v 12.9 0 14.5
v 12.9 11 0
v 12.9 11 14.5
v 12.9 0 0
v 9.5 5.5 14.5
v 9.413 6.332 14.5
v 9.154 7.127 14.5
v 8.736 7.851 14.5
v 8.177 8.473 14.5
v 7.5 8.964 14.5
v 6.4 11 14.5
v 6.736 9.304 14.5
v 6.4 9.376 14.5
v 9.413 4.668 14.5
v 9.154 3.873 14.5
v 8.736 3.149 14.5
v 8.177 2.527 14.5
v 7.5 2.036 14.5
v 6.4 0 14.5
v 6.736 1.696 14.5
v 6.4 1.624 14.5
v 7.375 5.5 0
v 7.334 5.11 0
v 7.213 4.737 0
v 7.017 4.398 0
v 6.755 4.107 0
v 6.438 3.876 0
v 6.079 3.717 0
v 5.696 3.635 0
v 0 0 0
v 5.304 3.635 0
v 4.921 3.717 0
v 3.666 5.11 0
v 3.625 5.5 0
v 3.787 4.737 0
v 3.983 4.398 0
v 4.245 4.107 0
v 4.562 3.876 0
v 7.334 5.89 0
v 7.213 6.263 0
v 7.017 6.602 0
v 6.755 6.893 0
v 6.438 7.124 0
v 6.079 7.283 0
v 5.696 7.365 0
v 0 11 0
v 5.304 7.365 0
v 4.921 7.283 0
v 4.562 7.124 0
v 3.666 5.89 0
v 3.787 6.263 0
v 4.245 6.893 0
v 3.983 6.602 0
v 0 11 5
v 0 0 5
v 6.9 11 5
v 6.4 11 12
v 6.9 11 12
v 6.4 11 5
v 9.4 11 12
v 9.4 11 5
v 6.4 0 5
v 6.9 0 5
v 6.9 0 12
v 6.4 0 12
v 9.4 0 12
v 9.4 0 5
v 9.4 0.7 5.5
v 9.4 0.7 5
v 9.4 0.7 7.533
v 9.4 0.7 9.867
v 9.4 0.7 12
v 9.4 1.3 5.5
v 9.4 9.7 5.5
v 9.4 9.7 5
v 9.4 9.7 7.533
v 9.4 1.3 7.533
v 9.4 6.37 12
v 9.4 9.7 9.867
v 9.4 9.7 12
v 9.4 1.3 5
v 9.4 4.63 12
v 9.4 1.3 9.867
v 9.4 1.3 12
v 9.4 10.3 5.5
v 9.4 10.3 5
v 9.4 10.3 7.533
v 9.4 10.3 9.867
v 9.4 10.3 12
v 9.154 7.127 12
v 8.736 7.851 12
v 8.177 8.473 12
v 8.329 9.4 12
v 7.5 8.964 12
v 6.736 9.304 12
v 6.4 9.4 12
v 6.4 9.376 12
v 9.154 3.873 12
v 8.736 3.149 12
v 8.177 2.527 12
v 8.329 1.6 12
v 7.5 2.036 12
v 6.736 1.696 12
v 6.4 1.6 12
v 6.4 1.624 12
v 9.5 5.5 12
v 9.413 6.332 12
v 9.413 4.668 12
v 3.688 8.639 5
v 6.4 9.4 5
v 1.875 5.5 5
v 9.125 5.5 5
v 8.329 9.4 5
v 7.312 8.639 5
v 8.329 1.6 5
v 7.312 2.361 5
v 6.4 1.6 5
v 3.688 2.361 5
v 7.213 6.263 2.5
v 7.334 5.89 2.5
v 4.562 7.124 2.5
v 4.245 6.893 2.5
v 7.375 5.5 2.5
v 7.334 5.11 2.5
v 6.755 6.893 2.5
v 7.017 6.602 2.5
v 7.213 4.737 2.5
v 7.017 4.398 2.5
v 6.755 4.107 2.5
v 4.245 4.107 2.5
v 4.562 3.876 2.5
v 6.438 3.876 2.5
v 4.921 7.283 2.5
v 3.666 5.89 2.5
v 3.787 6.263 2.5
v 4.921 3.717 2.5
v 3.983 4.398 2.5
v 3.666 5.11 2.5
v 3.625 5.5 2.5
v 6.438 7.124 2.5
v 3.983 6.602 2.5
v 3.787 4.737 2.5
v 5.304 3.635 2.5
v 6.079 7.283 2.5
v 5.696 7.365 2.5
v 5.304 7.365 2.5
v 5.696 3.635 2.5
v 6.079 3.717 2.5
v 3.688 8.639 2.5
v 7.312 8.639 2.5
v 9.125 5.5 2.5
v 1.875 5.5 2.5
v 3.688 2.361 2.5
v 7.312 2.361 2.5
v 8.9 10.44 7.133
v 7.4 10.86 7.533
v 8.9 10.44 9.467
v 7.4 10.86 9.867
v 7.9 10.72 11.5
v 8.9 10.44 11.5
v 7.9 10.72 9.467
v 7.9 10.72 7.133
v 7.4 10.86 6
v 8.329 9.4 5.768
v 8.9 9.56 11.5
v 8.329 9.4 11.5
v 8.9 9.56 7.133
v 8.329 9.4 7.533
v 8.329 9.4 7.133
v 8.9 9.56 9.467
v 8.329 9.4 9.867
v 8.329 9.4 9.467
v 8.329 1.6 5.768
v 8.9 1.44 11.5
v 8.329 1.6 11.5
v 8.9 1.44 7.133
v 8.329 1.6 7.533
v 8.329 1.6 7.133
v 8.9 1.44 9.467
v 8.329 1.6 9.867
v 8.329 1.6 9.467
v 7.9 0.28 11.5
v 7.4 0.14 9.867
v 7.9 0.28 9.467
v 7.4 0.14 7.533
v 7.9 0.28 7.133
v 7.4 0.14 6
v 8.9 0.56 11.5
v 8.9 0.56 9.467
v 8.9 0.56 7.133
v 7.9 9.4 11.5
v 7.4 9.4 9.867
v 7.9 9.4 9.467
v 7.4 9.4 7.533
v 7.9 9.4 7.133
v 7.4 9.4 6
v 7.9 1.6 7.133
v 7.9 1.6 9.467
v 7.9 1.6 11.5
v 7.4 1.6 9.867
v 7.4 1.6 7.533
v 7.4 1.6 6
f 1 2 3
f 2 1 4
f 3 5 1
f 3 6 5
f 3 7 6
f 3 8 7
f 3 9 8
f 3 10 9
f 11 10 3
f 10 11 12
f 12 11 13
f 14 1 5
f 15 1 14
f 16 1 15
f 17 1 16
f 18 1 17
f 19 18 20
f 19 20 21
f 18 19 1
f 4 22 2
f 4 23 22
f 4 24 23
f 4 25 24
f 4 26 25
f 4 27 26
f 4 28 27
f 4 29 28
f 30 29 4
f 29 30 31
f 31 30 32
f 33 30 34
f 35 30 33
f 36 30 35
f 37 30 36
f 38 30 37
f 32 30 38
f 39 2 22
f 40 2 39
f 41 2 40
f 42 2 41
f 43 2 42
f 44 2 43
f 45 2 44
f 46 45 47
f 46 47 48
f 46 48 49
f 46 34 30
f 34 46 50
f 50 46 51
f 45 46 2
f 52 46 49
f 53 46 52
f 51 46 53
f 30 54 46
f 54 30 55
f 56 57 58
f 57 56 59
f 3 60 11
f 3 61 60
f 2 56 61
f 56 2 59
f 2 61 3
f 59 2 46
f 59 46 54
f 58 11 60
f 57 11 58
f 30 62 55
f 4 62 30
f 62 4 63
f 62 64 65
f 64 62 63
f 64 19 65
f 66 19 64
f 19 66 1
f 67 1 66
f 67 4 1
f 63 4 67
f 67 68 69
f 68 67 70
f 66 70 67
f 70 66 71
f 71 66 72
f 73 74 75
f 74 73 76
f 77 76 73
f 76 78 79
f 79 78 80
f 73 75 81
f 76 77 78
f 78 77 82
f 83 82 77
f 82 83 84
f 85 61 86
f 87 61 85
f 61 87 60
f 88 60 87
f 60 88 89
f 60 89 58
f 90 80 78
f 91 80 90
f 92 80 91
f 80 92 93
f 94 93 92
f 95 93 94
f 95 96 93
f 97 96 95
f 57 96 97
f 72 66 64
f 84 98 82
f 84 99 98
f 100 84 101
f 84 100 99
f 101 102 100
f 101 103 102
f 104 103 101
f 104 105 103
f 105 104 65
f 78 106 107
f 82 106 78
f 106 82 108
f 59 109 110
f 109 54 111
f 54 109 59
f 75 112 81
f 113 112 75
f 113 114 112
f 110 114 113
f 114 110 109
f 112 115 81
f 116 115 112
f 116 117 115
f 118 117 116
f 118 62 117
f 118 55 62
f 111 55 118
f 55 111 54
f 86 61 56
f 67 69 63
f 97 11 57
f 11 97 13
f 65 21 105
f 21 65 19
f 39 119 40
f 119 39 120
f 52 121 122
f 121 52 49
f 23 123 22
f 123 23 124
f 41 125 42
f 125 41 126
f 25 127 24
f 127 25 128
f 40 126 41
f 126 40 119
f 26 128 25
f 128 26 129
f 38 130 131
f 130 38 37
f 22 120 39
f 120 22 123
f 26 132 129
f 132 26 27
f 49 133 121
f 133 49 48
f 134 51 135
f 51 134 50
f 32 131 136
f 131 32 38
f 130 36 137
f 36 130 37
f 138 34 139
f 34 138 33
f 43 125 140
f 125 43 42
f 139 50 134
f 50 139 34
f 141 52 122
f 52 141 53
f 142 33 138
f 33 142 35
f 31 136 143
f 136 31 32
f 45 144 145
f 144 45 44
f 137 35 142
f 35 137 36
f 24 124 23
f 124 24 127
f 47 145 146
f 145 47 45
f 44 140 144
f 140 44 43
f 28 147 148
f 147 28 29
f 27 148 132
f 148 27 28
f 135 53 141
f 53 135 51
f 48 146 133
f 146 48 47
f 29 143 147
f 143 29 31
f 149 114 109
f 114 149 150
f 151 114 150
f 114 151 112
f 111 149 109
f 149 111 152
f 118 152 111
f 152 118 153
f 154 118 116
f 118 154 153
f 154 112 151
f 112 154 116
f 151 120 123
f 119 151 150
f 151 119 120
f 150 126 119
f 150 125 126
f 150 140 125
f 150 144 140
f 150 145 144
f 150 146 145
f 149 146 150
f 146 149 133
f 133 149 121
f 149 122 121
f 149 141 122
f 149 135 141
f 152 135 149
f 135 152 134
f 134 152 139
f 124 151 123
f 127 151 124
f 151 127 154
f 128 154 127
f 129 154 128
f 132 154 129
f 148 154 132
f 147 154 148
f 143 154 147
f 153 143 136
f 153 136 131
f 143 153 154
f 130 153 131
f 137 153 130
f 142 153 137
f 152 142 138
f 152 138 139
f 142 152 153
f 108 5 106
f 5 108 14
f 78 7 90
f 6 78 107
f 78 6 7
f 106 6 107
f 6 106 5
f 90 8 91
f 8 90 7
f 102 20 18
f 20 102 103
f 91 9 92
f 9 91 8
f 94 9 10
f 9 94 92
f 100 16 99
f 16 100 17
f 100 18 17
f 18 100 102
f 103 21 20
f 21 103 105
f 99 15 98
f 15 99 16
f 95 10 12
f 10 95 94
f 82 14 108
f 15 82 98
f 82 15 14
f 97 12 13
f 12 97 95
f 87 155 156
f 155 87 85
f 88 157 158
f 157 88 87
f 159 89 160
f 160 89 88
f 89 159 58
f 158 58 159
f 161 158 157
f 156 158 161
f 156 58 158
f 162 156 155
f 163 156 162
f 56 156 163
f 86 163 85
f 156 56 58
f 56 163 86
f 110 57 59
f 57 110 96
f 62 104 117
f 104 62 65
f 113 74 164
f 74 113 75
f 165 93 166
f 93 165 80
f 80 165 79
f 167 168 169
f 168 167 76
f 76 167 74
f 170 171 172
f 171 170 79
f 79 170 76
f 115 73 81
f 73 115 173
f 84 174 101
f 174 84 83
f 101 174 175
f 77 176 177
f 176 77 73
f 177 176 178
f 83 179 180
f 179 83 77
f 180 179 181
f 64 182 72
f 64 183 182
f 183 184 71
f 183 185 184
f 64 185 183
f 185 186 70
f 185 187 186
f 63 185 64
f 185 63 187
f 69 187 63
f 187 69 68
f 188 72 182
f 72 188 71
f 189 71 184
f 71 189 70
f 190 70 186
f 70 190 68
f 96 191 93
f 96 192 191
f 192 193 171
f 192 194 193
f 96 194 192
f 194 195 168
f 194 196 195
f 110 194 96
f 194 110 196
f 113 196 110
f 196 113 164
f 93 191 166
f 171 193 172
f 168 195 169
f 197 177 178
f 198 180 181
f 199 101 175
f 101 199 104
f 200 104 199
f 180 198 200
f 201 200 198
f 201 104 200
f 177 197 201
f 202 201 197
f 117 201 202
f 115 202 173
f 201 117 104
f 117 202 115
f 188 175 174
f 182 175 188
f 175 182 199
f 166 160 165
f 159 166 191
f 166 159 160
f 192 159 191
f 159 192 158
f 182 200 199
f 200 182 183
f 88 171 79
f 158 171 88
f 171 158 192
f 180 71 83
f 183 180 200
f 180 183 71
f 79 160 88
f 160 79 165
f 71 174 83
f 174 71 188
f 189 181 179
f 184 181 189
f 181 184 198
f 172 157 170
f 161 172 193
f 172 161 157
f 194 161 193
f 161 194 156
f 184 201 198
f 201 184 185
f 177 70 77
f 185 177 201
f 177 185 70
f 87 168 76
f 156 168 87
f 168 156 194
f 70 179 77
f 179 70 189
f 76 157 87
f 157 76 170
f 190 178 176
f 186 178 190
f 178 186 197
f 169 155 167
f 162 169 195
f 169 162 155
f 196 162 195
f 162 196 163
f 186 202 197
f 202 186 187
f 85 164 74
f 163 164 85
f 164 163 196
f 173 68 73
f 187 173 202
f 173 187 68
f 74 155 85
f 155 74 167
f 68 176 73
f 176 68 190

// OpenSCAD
/*
  OneUp bed platform nut holder(s)
  
  M3 nut used with heated bed on TwoUp (v2) and OneUp v2
  M4 nut used with basic bed (v2)
  
  Changes:
    Thicker vertical wall
    Removed lip on upper horizontal surface
    Resized hexagonal and circular holes to conform to M3 bolt and screw sizes
    
*/

x_origin = 0;
y_origin = 0;
z_origin = 0;
x_long_inset = 9.4;
x_riser = 3.5;
x_length = x_long_inset + x_riser;
x_overhang = 3;
z_base = 5;
z_riser = 7;
z_top = 2.5;
z_height = z_base + z_riser + z_top;

y_constant = 11;                            // Piece is always 10mm wide
x_hole_offset = 5.5;                        // Hole is always 5.0mm from innermost edge
y_hole_offset = y_constant / 2;             // Center the hole

spring_diameter = 8.0;    // spring is 8mm

// Hardware specs (with extra allowance for 
M3_adjustment = 0.75;
M4_adjustment = 0.75;
M3_bolt_diameter = 3;
M4_bolt_diameter = 4;
M3_nut_diameter = 6.5;
M4_nut_diameter = 10;
M3_nut_height = 2.5;
M4_nut_height = 3.0;

// Point to either M3 or M4 specs
bolt_diameter = M3_bolt_diameter + M3_adjustment;
nut_diameter = M3_nut_diameter + M3_adjustment;
nut_height = M3_nut_height;                                 // Did not add adjustment because z-axis pretty accurate
nut_offset = z_base - nut_height;

// To make the actual code easier to read
x_cutout_1 = x_long_inset;
x_cutout_2 = x_long_inset - x_overhang;
z_origin_cutout_1 = z_origin + z_base;
z_origin_cutout_2 = z_origin + z_base + z_riser;
x_origin_hole = x_origin + x_hole_offset;
y_origin_hole = y_origin + y_hole_offset;
z_origin_hex_nut = z_origin + nut_offset;



rotate([0, 0, 0]) { difference () {
    // Create basic shape
    translate([x_origin, y_origin, z_origin])          cube([x_length, y_constant, z_height]);
    // Remove cutout 1
    translate([x_origin, y_origin, z_origin_cutout_1]) cube([x_long_inset , y_constant, z_riser]);
		
    // Remove cutout 2
    translate([x_origin, y_origin, z_origin_cutout_2])  cube([x_cutout_2, y_constant, z_top]);

    // Create hole for M3 bolt cylinder
    translate([x_origin_hole, y_origin_hole, z_origin]) cylinder(d=bolt_diameter, h=z_height, $fn=30);

    // Create hole for M3 hex nut holder
    translate([x_origin_hole, y_origin_hole, z_origin_hex_nut]) cylinder(d=nut_diameter, h=nut_height, $fn=6);
	
	// Cutout for spring on OneUp
	translate([x_origin_hole, y_origin_hole, z_height - z_top]) cylinder(d=spring_diameter, h=z_top, $fn=30);
}

// add support structure
translate([x_origin + x_cutout_2, y_origin, z_origin_cutout_1]) union() {
	color("red") difference() {
		linear_extrude(height=z_riser, center=false) union() {
			// side indented
			polygon(points=[
				[0,2], [0.5,2], [3,1.3],
				[3,0.7], [0.5,0], [0,0]
			]);
			translate([0, y_constant-2, 0]) polygon(points=[
				[0,2], [0.5,2], [3,1.3],
				[3,0.7], [0.5,0], [0,0]
			]);
		}
		translate([0, 1.6, 0]) cube([3 , y_constant-3.2, z_riser]);
		translate([1 , y_constant+1, 0]) rotate([90,0,0])
			linear_extrude(height=y_constant+2, center=false) union() {
				// bottom cutout
				polygon(points=[
					[0,1], [0.5,(z_riser/3)-0.2],
					[1.5,(z_riser/3)-0.2], [2,0.5]
				]);
				// middle cutout
				polygon(points=[
					[0,(z_riser/3)+0.2], [0.5,(z_riser*2/3)-0.2],
					[1.5,(z_riser*2/3)-0.2], [2,(z_riser/3)+0.2]
				]);
				// top cutout
				polygon(points=[
					[0,(z_riser*2/3)+0.2], [0.5,z_riser-0.5],
					[1.5,z_riser-0.5], [2,(z_riser*2/3)+0.2]
				]);
		};
	};
};

}
